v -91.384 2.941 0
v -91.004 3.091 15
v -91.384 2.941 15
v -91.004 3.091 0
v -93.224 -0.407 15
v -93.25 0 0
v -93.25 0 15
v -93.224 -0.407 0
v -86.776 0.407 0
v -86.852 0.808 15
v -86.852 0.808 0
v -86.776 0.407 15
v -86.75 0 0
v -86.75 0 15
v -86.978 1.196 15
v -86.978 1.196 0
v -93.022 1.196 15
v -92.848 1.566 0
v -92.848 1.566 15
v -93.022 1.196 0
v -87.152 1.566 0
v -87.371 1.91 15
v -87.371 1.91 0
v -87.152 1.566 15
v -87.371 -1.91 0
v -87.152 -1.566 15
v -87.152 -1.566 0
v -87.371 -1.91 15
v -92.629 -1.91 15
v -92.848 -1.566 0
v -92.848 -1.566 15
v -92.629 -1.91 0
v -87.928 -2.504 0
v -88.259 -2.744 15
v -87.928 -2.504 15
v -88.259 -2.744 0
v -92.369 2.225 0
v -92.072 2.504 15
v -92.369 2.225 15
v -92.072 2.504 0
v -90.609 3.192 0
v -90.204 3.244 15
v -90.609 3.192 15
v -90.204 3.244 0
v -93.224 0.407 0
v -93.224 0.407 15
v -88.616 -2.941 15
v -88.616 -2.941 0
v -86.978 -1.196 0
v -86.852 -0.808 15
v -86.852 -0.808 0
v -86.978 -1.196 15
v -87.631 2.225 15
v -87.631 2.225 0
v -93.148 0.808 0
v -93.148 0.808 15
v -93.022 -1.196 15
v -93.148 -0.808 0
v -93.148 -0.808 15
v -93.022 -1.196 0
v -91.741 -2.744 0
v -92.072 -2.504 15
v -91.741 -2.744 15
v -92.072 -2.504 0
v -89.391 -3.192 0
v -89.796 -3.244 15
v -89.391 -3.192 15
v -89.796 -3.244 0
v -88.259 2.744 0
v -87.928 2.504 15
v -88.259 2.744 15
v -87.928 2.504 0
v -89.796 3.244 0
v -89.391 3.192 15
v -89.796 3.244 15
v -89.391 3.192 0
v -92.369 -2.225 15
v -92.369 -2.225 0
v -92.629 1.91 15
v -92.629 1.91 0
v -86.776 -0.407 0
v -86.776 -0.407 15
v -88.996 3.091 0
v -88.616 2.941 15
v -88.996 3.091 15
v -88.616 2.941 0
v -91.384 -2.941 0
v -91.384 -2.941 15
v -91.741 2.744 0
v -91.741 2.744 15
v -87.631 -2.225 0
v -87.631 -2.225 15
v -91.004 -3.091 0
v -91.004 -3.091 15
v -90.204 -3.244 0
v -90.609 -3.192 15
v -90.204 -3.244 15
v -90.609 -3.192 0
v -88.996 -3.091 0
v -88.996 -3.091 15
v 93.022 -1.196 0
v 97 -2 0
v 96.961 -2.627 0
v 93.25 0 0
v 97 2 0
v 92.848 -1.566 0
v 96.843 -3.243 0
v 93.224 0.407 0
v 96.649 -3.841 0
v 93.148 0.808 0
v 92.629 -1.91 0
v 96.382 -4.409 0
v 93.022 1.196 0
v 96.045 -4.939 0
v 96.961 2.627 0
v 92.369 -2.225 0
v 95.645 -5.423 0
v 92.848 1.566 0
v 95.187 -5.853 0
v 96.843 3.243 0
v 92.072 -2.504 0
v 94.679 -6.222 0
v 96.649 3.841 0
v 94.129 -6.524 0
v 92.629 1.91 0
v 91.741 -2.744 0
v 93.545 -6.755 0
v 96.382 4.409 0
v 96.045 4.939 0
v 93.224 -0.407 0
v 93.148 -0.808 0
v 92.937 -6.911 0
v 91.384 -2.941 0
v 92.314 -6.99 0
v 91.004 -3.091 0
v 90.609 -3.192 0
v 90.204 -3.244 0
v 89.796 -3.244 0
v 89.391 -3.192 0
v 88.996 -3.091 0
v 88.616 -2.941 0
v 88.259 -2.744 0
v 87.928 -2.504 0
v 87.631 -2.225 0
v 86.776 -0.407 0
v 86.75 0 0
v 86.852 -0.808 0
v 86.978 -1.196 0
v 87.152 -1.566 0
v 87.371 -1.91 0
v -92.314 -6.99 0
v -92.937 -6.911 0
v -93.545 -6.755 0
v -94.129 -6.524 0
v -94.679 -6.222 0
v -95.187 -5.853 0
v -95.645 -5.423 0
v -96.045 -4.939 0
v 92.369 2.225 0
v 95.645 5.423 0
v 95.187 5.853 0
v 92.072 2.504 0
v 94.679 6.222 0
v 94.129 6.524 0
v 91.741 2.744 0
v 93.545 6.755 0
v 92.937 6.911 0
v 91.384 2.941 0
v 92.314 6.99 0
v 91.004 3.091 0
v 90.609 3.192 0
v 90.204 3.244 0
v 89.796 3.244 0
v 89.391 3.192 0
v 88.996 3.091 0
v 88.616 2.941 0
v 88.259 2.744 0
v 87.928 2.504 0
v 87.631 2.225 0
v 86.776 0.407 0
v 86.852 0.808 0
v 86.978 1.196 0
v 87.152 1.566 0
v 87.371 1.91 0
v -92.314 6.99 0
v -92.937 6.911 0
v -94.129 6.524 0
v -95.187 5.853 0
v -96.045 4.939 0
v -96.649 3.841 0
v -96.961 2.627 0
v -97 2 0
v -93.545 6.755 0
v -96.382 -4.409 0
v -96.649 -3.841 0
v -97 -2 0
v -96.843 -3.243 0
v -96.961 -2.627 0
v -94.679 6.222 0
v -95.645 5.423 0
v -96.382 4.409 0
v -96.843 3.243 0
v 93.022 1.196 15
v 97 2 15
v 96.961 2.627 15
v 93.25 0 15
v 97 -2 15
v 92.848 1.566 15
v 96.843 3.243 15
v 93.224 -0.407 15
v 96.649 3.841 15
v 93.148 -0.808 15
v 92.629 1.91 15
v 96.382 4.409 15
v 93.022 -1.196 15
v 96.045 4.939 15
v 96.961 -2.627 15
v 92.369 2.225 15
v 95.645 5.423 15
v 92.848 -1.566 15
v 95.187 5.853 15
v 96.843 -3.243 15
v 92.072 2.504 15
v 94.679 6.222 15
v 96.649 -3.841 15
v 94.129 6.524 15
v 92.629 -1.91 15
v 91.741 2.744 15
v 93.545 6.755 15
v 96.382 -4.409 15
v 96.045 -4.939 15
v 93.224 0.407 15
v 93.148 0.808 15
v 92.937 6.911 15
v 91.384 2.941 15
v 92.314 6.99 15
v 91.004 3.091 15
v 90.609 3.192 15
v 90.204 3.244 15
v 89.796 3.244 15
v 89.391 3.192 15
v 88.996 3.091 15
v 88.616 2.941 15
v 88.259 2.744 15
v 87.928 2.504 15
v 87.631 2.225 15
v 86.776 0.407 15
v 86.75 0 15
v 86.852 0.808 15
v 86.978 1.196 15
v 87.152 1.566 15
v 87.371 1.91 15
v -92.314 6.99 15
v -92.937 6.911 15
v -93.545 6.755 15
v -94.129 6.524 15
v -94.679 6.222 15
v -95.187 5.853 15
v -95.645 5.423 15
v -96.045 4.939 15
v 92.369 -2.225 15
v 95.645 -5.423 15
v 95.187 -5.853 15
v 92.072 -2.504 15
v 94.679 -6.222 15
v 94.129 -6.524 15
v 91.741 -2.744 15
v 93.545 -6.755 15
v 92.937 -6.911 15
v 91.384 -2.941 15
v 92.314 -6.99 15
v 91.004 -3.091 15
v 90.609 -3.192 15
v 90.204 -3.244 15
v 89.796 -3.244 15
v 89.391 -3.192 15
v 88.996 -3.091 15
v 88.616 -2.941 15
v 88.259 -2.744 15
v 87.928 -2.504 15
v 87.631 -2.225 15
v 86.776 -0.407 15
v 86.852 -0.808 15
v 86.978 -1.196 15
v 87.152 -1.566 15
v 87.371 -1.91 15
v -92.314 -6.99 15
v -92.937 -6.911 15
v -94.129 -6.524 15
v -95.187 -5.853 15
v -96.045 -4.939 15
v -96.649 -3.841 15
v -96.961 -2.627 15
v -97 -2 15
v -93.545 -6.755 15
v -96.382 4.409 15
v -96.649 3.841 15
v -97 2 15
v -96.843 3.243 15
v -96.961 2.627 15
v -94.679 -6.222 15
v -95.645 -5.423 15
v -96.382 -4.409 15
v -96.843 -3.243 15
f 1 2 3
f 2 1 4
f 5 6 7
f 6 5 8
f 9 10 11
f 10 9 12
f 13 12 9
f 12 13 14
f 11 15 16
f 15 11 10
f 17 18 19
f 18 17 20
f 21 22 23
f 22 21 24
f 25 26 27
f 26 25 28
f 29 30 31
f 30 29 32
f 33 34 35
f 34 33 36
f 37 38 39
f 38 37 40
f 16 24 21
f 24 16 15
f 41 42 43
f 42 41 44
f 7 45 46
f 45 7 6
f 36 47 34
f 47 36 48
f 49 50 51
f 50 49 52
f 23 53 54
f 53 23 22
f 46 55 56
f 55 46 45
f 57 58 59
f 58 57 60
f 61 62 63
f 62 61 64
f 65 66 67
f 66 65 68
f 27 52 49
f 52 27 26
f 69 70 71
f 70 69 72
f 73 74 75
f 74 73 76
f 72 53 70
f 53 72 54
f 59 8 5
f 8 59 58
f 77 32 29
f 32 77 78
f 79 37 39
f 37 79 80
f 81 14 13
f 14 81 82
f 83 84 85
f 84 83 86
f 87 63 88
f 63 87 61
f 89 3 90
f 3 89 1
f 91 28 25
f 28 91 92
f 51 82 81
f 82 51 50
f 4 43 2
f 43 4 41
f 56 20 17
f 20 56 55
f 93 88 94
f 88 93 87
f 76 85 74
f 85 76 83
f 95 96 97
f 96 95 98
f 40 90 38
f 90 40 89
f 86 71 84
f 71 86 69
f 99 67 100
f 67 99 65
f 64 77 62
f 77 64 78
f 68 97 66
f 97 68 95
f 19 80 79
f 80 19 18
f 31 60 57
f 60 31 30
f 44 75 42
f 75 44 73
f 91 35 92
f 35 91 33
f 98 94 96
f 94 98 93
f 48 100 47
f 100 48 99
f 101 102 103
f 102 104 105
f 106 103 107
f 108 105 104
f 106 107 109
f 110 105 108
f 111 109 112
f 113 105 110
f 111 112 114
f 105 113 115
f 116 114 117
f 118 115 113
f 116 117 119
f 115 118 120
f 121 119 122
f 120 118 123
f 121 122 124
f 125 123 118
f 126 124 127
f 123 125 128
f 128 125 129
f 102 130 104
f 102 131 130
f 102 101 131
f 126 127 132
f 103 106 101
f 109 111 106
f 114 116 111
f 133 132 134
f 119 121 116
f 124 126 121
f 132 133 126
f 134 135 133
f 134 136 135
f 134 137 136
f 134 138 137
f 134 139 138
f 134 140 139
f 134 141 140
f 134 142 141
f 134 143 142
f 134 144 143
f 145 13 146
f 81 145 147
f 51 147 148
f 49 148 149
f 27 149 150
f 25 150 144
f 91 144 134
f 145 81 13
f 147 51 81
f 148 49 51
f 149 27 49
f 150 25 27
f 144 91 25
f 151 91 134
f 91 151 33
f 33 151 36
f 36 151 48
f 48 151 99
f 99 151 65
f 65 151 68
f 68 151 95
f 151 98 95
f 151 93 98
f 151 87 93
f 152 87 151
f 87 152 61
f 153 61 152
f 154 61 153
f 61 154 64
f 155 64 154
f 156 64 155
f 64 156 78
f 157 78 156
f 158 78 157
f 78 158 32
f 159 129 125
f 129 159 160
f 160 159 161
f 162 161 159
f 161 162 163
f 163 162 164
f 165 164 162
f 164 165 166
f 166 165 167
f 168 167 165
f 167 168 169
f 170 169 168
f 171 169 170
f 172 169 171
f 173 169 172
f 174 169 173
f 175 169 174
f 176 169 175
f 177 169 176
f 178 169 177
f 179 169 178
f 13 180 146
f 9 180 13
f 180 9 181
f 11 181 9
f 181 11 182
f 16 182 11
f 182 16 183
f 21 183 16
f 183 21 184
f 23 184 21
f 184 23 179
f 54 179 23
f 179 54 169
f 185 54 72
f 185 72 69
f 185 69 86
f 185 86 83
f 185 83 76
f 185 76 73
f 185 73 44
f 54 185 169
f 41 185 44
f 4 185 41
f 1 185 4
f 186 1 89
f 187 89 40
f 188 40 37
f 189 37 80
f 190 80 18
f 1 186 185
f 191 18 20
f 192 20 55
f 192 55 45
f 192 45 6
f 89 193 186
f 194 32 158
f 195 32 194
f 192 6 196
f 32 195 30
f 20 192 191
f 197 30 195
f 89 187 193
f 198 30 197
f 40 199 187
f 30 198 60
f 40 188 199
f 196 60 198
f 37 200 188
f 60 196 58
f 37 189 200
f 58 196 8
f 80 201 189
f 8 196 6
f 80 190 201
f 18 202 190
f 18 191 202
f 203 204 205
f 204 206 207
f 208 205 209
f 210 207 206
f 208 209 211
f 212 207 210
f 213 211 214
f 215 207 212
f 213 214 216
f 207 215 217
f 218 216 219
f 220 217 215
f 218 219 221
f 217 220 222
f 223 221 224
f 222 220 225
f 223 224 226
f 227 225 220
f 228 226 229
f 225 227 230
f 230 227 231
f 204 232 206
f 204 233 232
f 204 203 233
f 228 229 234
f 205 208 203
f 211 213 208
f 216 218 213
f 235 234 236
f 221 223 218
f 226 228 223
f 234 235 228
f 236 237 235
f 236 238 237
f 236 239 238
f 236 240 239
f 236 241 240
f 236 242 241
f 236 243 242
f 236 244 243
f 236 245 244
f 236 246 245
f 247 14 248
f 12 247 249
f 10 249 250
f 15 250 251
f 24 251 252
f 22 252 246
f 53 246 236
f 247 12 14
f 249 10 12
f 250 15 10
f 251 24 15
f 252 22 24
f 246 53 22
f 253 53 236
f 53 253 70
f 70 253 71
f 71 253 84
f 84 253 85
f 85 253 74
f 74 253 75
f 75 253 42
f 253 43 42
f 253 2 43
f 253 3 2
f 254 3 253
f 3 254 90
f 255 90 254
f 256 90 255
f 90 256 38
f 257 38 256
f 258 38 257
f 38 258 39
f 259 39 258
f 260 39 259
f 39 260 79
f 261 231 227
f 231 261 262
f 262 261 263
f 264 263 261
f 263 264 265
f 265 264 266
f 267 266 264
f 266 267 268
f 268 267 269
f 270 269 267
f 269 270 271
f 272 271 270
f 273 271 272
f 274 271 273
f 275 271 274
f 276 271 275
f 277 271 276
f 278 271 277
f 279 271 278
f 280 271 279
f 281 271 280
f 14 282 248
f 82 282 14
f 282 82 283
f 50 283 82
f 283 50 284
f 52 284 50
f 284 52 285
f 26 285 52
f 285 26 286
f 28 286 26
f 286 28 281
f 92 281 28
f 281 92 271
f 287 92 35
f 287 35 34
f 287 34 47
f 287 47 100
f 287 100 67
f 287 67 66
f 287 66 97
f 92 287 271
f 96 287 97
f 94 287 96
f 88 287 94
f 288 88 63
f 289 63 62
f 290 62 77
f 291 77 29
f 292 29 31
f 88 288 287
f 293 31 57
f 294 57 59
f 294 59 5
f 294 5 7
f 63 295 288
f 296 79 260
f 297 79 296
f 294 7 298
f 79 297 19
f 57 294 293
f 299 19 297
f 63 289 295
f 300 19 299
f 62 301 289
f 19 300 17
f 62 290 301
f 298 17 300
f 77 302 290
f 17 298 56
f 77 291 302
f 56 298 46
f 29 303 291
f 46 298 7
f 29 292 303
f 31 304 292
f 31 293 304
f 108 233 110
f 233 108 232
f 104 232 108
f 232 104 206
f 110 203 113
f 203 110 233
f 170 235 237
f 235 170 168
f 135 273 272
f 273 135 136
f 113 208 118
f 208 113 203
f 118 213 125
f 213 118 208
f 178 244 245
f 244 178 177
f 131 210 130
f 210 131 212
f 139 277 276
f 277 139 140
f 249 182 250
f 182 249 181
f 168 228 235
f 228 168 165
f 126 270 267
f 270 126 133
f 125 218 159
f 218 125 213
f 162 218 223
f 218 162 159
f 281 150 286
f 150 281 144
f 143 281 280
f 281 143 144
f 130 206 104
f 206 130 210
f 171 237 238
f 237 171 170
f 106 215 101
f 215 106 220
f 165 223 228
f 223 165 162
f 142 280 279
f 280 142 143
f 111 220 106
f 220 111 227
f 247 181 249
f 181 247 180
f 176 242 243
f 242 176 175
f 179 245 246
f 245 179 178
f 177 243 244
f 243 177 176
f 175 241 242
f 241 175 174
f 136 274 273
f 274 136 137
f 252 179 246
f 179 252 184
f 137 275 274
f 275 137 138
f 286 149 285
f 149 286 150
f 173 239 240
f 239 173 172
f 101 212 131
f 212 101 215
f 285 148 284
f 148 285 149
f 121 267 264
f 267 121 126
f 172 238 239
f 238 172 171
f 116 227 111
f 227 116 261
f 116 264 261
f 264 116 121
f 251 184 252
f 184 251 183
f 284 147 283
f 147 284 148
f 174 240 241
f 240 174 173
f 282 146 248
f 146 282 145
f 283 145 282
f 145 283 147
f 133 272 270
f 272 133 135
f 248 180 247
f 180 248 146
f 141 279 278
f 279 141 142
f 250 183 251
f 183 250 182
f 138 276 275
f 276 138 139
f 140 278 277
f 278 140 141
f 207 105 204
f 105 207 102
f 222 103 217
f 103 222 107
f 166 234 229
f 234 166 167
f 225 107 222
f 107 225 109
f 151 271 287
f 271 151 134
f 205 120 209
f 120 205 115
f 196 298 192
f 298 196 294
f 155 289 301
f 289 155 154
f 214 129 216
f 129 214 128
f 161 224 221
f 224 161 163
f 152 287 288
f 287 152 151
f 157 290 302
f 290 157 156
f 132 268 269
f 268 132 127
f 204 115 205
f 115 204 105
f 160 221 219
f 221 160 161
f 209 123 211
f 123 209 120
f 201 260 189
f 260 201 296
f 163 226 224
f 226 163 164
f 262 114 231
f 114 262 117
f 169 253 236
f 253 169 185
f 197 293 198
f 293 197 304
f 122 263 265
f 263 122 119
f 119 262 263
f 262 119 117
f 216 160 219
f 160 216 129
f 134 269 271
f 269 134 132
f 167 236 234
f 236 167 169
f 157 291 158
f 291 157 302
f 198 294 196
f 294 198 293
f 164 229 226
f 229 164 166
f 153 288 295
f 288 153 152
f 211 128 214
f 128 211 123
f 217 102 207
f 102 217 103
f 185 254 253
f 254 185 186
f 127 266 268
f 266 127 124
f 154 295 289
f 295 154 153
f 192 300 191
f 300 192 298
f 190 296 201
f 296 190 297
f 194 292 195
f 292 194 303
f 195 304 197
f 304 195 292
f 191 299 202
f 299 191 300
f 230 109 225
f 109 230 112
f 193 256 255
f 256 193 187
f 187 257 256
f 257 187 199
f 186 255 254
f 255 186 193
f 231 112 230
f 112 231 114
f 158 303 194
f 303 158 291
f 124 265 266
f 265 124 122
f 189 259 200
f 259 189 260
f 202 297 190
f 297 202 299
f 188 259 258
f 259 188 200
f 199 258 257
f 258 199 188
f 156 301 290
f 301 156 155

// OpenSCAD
$fn = 50;


difference() {
	union() {
		hull() {
			translate(v = [-92.0000000000, 2.0000000000, 0]) {
				cylinder(h = 15, r = 5);
			}
			translate(v = [92.0000000000, 2.0000000000, 0]) {
				cylinder(h = 15, r = 5);
			}
			translate(v = [-92.0000000000, -2.0000000000, 0]) {
				cylinder(h = 15, r = 5);
			}
			translate(v = [92.0000000000, -2.0000000000, 0]) {
				cylinder(h = 15, r = 5);
			}
		}
	}
	union() {
		translate(v = [-90.0000000000, 0.0000000000, 0]) {
			cylinder(h = 15, r = 3.2500000000);
		}
		translate(v = [90.0000000000, 0.0000000000, 0]) {
			cylinder(h = 15, r = 3.2500000000);
		}
		translate(v = [-90.0000000000, 0.0000000000, 0]) {
			cylinder(h = 15, r = 1.8000000000);
		}
		translate(v = [90.0000000000, 0.0000000000, 0]) {
			cylinder(h = 15, r = 1.8000000000);
		}
		translate(v = [-90.0000000000, 0.0000000000, 0]) {
			cylinder(h = 15, r = 1.8000000000);
		}
		translate(v = [90.0000000000, 0.0000000000, 0]) {
			cylinder(h = 15, r = 1.8000000000);
		}
		translate(v = [-90.0000000000, 0.0000000000, 0]) {
			cylinder(h = 15, r = 1.8000000000);
		}
		translate(v = [90.0000000000, 0.0000000000, 0]) {
			cylinder(h = 15, r = 1.8000000000);
		}
	}
}
